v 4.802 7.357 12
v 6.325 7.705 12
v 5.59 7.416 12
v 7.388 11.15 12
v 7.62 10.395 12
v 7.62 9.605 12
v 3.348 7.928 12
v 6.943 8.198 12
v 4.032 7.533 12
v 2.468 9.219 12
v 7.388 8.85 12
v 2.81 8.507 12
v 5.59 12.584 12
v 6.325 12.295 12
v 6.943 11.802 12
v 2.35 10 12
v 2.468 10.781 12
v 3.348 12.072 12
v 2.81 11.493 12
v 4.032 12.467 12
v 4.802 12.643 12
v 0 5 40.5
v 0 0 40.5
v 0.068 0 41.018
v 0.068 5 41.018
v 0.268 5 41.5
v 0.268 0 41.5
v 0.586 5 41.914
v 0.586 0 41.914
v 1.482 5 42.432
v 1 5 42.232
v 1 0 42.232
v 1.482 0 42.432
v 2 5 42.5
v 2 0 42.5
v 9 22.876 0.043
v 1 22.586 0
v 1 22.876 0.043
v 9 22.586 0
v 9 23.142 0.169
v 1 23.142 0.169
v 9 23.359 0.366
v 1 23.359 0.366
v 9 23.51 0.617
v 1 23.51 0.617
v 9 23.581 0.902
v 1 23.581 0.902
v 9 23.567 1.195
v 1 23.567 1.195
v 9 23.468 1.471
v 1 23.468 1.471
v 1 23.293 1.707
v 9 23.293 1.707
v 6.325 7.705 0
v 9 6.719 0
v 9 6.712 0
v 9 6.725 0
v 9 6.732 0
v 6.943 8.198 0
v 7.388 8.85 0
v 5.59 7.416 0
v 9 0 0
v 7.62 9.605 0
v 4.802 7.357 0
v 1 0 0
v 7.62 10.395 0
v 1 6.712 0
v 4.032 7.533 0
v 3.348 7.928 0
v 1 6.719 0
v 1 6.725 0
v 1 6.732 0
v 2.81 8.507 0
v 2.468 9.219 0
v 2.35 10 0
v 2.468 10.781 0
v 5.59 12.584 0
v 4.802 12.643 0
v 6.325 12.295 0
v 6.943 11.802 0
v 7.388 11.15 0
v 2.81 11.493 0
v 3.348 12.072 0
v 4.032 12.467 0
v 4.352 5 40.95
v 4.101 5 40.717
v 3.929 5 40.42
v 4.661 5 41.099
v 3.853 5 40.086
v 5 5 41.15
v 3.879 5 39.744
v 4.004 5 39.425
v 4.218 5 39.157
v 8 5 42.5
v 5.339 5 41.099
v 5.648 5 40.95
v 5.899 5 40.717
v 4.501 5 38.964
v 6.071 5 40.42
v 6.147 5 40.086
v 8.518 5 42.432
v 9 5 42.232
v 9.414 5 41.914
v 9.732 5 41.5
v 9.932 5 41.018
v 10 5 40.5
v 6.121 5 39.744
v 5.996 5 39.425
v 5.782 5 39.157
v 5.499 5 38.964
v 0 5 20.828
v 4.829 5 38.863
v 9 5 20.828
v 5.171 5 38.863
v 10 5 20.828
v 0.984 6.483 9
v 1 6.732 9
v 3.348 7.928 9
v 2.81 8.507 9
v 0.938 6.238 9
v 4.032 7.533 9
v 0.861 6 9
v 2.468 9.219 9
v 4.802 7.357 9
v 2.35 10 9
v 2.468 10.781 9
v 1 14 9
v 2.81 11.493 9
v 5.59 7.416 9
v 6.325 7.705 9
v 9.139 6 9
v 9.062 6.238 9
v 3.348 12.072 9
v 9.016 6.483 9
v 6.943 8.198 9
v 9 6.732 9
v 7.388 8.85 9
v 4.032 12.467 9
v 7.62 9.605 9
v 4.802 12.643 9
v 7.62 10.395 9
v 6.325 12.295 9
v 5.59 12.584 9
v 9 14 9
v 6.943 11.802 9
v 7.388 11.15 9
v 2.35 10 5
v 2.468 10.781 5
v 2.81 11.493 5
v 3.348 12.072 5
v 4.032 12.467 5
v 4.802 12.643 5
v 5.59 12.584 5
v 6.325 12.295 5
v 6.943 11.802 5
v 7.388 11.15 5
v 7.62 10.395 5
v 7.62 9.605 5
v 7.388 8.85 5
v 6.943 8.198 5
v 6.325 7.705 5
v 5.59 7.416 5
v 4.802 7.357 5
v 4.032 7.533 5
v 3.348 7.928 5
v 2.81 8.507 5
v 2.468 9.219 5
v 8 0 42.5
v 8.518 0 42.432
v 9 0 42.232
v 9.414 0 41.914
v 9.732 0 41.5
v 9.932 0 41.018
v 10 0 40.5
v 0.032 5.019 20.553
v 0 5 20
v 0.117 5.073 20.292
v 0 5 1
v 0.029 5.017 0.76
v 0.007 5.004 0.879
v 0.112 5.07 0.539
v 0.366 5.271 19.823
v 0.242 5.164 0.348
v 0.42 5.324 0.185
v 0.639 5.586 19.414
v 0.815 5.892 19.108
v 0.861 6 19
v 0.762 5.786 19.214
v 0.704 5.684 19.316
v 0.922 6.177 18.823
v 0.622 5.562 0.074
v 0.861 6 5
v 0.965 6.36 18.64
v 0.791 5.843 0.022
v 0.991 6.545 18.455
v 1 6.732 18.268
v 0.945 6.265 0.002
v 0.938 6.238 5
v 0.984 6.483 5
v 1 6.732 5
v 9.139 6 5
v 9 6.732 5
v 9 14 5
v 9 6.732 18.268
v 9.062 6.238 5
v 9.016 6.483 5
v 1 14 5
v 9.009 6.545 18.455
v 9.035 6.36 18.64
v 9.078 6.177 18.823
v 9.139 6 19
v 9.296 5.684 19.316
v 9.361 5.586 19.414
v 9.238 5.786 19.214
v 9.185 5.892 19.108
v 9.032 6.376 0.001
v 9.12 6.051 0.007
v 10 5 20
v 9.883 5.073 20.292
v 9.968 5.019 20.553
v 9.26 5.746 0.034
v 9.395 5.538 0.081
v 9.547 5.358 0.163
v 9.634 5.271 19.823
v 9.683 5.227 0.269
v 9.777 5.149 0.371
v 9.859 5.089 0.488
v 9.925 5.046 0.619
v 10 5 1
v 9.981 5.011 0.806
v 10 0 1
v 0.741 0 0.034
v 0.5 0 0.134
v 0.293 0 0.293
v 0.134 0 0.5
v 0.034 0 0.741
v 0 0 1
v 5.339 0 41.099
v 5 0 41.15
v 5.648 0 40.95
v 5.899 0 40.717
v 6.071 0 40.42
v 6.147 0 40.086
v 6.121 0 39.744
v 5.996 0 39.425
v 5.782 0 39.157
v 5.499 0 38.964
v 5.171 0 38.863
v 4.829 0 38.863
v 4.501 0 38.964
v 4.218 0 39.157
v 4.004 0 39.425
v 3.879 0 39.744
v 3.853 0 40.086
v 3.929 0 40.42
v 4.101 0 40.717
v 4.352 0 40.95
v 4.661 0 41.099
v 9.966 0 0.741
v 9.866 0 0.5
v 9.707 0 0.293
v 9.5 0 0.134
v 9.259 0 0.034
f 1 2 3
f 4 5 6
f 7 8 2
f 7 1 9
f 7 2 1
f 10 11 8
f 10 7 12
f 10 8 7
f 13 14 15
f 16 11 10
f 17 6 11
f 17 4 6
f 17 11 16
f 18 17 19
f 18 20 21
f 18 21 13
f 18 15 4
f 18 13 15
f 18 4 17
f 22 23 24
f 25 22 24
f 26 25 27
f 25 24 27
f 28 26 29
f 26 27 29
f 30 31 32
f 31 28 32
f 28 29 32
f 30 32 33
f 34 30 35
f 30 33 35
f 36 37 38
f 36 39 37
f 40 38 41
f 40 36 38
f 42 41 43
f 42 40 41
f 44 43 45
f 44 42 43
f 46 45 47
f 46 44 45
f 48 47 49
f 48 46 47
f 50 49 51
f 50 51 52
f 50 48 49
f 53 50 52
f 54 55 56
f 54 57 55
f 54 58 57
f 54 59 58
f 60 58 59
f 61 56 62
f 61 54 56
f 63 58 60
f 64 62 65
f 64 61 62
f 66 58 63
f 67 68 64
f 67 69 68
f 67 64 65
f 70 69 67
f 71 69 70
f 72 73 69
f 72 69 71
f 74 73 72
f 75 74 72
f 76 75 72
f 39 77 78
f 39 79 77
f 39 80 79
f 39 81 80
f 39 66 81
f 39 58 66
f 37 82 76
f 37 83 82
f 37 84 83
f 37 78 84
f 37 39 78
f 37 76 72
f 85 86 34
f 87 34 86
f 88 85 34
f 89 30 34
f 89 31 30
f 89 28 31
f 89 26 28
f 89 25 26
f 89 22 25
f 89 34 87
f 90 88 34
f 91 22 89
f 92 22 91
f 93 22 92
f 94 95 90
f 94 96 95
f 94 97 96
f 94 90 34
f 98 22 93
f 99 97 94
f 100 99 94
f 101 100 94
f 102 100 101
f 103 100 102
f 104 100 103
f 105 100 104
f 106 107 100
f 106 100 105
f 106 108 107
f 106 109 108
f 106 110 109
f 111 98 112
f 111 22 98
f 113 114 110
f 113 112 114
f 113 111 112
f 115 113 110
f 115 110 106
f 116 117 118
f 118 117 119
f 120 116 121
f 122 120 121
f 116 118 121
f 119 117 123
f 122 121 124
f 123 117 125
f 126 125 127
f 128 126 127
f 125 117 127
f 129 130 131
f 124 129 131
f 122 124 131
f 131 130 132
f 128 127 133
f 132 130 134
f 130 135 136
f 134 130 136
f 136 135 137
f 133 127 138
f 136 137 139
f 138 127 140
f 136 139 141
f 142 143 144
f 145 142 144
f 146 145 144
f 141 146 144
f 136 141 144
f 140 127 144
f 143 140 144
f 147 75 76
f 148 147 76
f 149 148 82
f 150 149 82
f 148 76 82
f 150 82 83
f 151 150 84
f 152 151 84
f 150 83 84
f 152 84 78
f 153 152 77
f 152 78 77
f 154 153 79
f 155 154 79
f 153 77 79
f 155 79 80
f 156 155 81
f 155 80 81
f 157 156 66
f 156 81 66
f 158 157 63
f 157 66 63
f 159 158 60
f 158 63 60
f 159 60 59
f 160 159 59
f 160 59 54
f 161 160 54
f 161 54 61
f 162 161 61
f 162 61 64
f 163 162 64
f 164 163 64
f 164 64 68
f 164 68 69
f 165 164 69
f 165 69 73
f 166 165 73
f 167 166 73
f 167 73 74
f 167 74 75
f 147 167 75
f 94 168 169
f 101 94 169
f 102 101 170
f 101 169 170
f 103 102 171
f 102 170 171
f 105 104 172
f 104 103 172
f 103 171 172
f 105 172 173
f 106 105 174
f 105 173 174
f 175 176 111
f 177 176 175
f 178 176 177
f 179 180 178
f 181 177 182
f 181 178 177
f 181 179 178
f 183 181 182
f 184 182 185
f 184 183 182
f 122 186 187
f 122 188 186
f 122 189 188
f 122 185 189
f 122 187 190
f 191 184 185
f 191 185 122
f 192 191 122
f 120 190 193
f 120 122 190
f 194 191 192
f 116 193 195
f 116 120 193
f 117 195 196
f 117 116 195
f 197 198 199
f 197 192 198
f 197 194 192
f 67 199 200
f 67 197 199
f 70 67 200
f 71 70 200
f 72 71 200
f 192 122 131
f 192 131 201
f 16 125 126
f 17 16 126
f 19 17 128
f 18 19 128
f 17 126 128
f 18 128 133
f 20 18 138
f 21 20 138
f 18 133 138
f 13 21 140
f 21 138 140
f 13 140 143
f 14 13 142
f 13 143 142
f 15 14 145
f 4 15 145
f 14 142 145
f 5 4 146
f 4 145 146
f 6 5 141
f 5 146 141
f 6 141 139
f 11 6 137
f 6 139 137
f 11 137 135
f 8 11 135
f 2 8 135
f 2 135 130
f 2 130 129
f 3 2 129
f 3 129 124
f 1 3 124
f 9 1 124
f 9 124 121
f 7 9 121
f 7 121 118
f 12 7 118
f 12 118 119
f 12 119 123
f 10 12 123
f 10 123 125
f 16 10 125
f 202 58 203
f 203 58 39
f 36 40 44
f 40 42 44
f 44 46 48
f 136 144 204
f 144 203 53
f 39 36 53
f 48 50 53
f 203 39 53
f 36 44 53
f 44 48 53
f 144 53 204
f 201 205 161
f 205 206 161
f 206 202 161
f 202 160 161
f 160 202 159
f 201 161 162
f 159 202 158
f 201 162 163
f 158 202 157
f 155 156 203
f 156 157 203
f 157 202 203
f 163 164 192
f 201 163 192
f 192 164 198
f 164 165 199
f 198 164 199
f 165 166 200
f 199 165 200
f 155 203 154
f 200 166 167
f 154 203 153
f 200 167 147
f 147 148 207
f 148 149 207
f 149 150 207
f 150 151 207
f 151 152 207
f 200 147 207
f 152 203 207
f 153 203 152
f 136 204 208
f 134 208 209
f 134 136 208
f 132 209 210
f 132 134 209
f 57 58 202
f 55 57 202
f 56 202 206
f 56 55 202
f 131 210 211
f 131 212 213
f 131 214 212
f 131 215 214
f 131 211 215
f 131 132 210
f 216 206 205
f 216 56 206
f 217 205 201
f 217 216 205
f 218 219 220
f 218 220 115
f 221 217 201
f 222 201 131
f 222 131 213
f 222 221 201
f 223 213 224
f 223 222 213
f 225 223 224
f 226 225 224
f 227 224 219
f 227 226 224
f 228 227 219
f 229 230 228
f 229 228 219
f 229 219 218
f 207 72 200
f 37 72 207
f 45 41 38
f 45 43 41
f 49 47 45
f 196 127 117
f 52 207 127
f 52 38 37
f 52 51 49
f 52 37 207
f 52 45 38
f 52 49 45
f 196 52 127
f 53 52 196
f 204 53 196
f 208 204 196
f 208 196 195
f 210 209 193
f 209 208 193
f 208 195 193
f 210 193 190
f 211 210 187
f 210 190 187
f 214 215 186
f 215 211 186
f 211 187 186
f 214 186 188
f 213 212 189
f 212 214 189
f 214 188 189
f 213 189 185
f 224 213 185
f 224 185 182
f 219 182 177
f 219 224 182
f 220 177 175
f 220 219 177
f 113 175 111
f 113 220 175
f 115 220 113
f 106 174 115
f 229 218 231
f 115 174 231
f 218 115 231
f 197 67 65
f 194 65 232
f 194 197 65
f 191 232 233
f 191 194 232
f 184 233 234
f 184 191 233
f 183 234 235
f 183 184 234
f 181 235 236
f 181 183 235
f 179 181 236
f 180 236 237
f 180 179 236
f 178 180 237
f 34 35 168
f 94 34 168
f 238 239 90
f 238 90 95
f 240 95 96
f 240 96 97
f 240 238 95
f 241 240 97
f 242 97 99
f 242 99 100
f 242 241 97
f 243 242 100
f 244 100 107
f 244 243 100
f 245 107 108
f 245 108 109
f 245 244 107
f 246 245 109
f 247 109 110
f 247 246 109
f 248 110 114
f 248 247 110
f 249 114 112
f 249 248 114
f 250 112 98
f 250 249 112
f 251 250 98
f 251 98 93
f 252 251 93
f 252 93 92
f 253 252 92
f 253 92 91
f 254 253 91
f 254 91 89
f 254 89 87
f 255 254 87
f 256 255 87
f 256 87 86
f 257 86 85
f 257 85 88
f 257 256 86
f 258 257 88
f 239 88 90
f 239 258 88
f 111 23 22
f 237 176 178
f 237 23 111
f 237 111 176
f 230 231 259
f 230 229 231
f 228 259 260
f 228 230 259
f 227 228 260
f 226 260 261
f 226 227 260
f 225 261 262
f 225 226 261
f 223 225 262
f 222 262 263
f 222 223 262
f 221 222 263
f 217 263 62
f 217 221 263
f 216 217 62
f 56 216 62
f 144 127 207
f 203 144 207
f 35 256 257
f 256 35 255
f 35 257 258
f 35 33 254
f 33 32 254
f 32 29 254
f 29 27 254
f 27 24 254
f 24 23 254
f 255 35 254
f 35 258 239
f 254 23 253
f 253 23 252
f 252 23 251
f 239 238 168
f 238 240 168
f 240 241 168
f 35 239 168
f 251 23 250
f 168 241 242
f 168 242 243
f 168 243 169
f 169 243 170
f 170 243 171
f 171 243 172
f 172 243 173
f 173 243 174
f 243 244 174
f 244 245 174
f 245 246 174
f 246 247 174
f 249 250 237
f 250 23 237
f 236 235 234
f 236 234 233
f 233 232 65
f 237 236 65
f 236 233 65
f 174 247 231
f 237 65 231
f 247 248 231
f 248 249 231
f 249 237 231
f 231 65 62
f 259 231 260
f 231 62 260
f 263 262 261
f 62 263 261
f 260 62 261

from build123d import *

# Parameters (mm, degrees)
SKETCH2_W                = 10
SKETCH2_H                = 42.5
SKETCH2_R                = 1.15
BOSS_EXTRUDE1_DEPTH      = 5
BOSS_EXTRUDE2_DEPTH      = 4
BOSS_EXTRUDE2_DEPTH_BACK = 4
SKETCH4_R                = 2.65
CUT_EXTRUDE1_DEPTH       = 12
SKETCH5_W                = 4
SKETCH5_H                = 8
CUT_EXTRUDE2_DEPTH       = 51.122350304
FILLET1_R                = 2
FILLET2_R                = 1


# Some blends are built 0.0001 mm under size
with BuildPart() as part:
    # Sketch2 → Boss-Extrude1 (new body)
    with BuildSketch(Plane(origin=(0, 0, 0), x_dir=(1, 0, 0), z_dir=(0, 1, 0))):
        with Locations((5, -21.25)):
            Rectangle(SKETCH2_W, SKETCH2_H)
        with Locations(Location((5, -40, 0), (0, 0, 270))):
            Circle(SKETCH2_R, mode=Mode.SUBTRACT)
    extrude(amount=BOSS_EXTRUDE1_DEPTH)

    # Sketch3 → Boss-Extrude2 (add, two sides: drawn at the far end of the back side and taken through both)
    with BuildSketch(Plane(origin=(5, 0, 0), x_dir=(0, 0, -1), z_dir=(1, 0, 0)).offset(-BOSS_EXTRUDE2_DEPTH_BACK)):
        Polygon((0, 5), (-20, 5), (0, 25), align=None)
    extrude(amount=BOSS_EXTRUDE2_DEPTH + BOSS_EXTRUDE2_DEPTH_BACK)

    # Sketch4 → Cut-Extrude1 (cut)
    with BuildSketch(Plane(origin=(0, 0, 0), x_dir=(-1, 0, 0), z_dir=(0, 0, -1))):
        with Locations((-5, 10)):
            Circle(SKETCH4_R)
    extrude(amount=-CUT_EXTRUDE1_DEPTH, mode=Mode.SUBTRACT)

    # Sketch5 → Cut-Extrude2 (cut, through all)
    with BuildSketch(Plane(origin=(9, 0, 0), x_dir=(0, 0, -1), z_dir=(1, 0, 0))):
        with Locations((-7, 10)):
            Rectangle(SKETCH5_W, SKETCH5_H)
    extrude(amount=-CUT_EXTRUDE2_DEPTH, mode=Mode.SUBTRACT)

    # Fillet1
    # the kernel refuses this fillet: 2 mm, written as the material it adds along each edge
    with BuildSketch(Plane(origin=(1, 5, 0), x_dir=(-1, 0, 0), z_dir=(0, 0, 1))) as fillet1_piece_1_section:
        with BuildLine():
            CenterArc((2, -1.732050808), FILLET1_R, 120, 60)
            Line((0, -1.732050808), (0, 0))
            Line((0, 0), (1, 0))
        make_face()
    fillet1_piece_1 = extrude(amount=24.330127019, mode=Mode.PRIVATE)
    fillet1_piece_1 = split(fillet1_piece_1, bisect_by=Plane(origin=(1, 15, 10), z_dir=(0, -0.7071067811865475, -0.7071067811865476)), keep=Keep.TOP, mode=Mode.PRIVATE)
    fillet1_piece_1 = split(fillet1_piece_1, bisect_by=Plane(origin=(1, 6, 0), z_dir=(0, -1, 0)), keep=Keep.TOP, mode=Mode.PRIVATE)
    add(fillet1_piece_1)
    with BuildSketch(Plane(origin=(1, 5, 0), x_dir=(-1, 0, 0), z_dir=(0, 0, 1))) as fillet1_piece_2_section:
        with BuildLine():
            CenterArc((2, -1.732050808), FILLET1_R, 120, 60)
            Line((0, -1.732050808), (0, 0))
            Line((0, 0), (1, 0))
        make_face()
    fillet1_piece_2 = extrude(amount=24.330127019, mode=Mode.PRIVATE)
    fillet1_piece_2 = split(fillet1_piece_2, bisect_by=Plane(origin=(1, 5, 5), z_dir=(0, 0, -1)), keep=Keep.TOP, mode=Mode.PRIVATE)
    add(fillet1_piece_2)
    with BuildSketch(Plane(origin=(1, 5, -4.330127019), x_dir=(-1, 0, 0), z_dir=(0, 0, 1))) as fillet1_piece_3_section:
        with BuildLine():
            CenterArc((2, -1.732050808), FILLET1_R, 120, 60)
            Line((0, -1.732050808), (0, 0))
            Line((0, 0), (1, 0))
        make_face()
    fillet1_piece_3 = extrude(amount=28.660254038, mode=Mode.PRIVATE)
    fillet1_piece_3 = split(fillet1_piece_3, bisect_by=Plane(origin=(1, 17.165063509, 7.834936491), z_dir=(0, -0.7071067811865475, -0.7071067811865476)), keep=Keep.TOP, mode=Mode.PRIVATE)
    fillet1_piece_3 = split(fillet1_piece_3, bisect_by=Plane(origin=(1, 5, 9), z_dir=(0, 0, 1)), keep=Keep.TOP, mode=Mode.PRIVATE)
    add(fillet1_piece_3)
    with BuildSketch(Plane(origin=(9, 5, 0), x_dir=(1, 0, 0), z_dir=(0, 0, 1))) as fillet1_piece_4_section:
        with BuildLine():
            CenterArc((2, 1.732050808), FILLET1_R, 180, 60)
            Line((0, 1.732050808), (0, 0))
            Line((0, 0), (1, 0))
        make_face()
    fillet1_piece_4 = extrude(amount=24.330127019, mode=Mode.PRIVATE)
    fillet1_piece_4 = split(fillet1_piece_4, bisect_by=Plane(origin=(9, 15, 10), z_dir=(0, -0.7071067811865475, -0.7071067811865476)), keep=Keep.TOP, mode=Mode.PRIVATE)
    fillet1_piece_4 = split(fillet1_piece_4, bisect_by=Plane(origin=(9, 6, 0), z_dir=(0, -1, 0)), keep=Keep.TOP, mode=Mode.PRIVATE)
    add(fillet1_piece_4)
    with BuildSketch(Plane(origin=(9, 5, 0), x_dir=(1, 0, 0), z_dir=(0, 0, 1))) as fillet1_piece_5_section:
        with BuildLine():
            CenterArc((2, 1.732050808), FILLET1_R, 180, 60)
            Line((0, 1.732050808), (0, 0))
            Line((0, 0), (1, 0))
        make_face()
    fillet1_piece_5 = extrude(amount=24.330127019, mode=Mode.PRIVATE)
    fillet1_piece_5 = split(fillet1_piece_5, bisect_by=Plane(origin=(9, 5, 5), z_dir=(0, 0, -1)), keep=Keep.TOP, mode=Mode.PRIVATE)
    add(fillet1_piece_5)
    with BuildSketch(Plane(origin=(9, 5, -4.330127019), x_dir=(1, 0, 0), z_dir=(0, 0, 1))) as fillet1_piece_6_section:
        with BuildLine():
            CenterArc((2, 1.732050808), FILLET1_R, 180, 60)
            Line((0, 1.732050808), (0, 0))
            Line((0, 0), (1, 0))
        make_face()
    fillet1_piece_6 = extrude(amount=28.660254038, mode=Mode.PRIVATE)
    fillet1_piece_6 = split(fillet1_piece_6, bisect_by=Plane(origin=(9, 17.165063509, 7.834936491), z_dir=(0, -0.7071067811865475, -0.7071067811865476)), keep=Keep.TOP, mode=Mode.PRIVATE)
    fillet1_piece_6 = split(fillet1_piece_6, bisect_by=Plane(origin=(9, 5, 9), z_dir=(0, 0, 1)), keep=Keep.TOP, mode=Mode.PRIVATE)
    add(fillet1_piece_6)
    with BuildSketch(Plane(origin=(9, 5, 20), x_dir=(0, 0, 1), z_dir=(-1, 0, 0))) as fillet1_piece_7:
        with BuildLine():
            CenterArc((FILLET1_R * 0.414213562373, FILLET1_R), FILLET1_R, 225, 45)
            Line((-FILLET1_R * 0.292893218813, FILLET1_R * 0.292893218813), (0, 0))
            Line((0, 0), (FILLET1_R * 0.414213562373, 0))
        make_face()
    extrude(amount=8)
    with BuildSketch(Plane(origin=(9, 5, 20), x_dir=(0, 0, 1), z_dir=(-1, 0, 0))) as fillet1_piece_8a_section:
        with BuildLine():
            CenterArc((FILLET1_R * 0.414213562373, FILLET1_R), FILLET1_R, 225, 45)
            Line((-FILLET1_R * 0.292893218813, FILLET1_R * 0.292893218813), (0, 0))
            Line((0, 0), (FILLET1_R * 0.414213562373, 0))
        make_face()
    fillet1_piece_8a = extrude(amount=10.071067812, mode=Mode.PRIVATE)
    fillet1_piece_8a = split(fillet1_piece_8a, bisect_by=Plane(origin=(0, 5, 20), z_dir=(1, 0, 0)), keep=Keep.TOP, mode=Mode.PRIVATE)
    fillet1_piece_8a = split(fillet1_piece_8a, bisect_by=Plane(origin=(1, 5, 20), z_dir=(-1, 0, 0)), keep=Keep.TOP, mode=Mode.PRIVATE)
    with BuildSketch(Plane(origin=(1, 5, 0), x_dir=(-1, 0, 0), z_dir=(0, 0, 1))) as fillet1_piece_8b_section:
        with BuildLine():
            CenterArc((2, -1.732050808), FILLET1_R, 120, 60)
            Line((0, -1.732050808), (0, 0))
            Line((0, 0), (1, 0))
        make_face()
    fillet1_piece_8b = extrude(amount=24.330127019, mode=Mode.PRIVATE)
    fillet1_piece_8b = split(fillet1_piece_8b, bisect_by=Plane(origin=(1, 15, 10), z_dir=(0, 0.7071067811865475, 0.7071067811865476)), keep=Keep.TOP, mode=Mode.PRIVATE)
    fillet1_piece_8b = split(fillet1_piece_8b, bisect_by=Plane(origin=(1, 6, 0), z_dir=(0, -1, 0)), keep=Keep.TOP, mode=Mode.PRIVATE)
    fillet1_piece_8 = fillet1_piece_8a & fillet1_piece_8b
    add(fillet1_piece_8)
    with BuildSketch(Plane(origin=(9, 5, 0), x_dir=(1, 0, 0), z_dir=(0, 0, 1))) as fillet1_piece_9a_section:
        with BuildLine():
            CenterArc((2, 1.732050808), FILLET1_R, 180, 60)
            Line((0, 1.732050808), (0, 0))
            Line((0, 0), (1, 0))
        make_face()
    fillet1_piece_9a = extrude(amount=24.330127019, mode=Mode.PRIVATE)
    fillet1_piece_9a = split(fillet1_piece_9a, bisect_by=Plane(origin=(9, 15, 10), z_dir=(0, 0.7071067811865475, 0.7071067811865476)), keep=Keep.TOP, mode=Mode.PRIVATE)
    fillet1_piece_9a = split(fillet1_piece_9a, bisect_by=Plane(origin=(9, 6, 0), z_dir=(0, -1, 0)), keep=Keep.TOP, mode=Mode.PRIVATE)
    with BuildSketch(Plane(origin=(11.071067812, 5, 20), x_dir=(0, 0, 1), z_dir=(-1, 0, 0))) as fillet1_piece_9b_section:
        with BuildLine():
            CenterArc((FILLET1_R * 0.414213562373, FILLET1_R), FILLET1_R, 225, 45)
            Line((-FILLET1_R * 0.292893218813, FILLET1_R * 0.292893218813), (0, 0))
            Line((0, 0), (FILLET1_R * 0.414213562373, 0))
        make_face()
    fillet1_piece_9b = extrude(amount=10.071067812, mode=Mode.PRIVATE)
    fillet1_piece_9b = split(fillet1_piece_9b, bisect_by=Plane(origin=(10, 5, 20), z_dir=(-1, 0, 0)), keep=Keep.TOP, mode=Mode.PRIVATE)
    fillet1_piece_9b = split(fillet1_piece_9b, bisect_by=Plane(origin=(9, 5, 20), z_dir=(1, 0, 0)), keep=Keep.TOP, mode=Mode.PRIVATE)
    fillet1_piece_9 = fillet1_piece_9a & fillet1_piece_9b
    add(fillet1_piece_9)
    # the kernel refuses this fillet: 2 mm, written as the material it takes off along each edge
    with BuildSketch(Plane(origin=(0, -5, 42.5), x_dir=(1, 0, 0), z_dir=(0, 1, 0))) as fillet1_2_piece_1:
        with BuildLine():
            CenterArc((FILLET1_R, FILLET1_R), FILLET1_R, 180, 90)
            Line((0, FILLET1_R), (0, 0))
            Line((0, 0), (FILLET1_R, 0))
        make_face()
    extrude(amount=15, mode=Mode.SUBTRACT)
    with BuildSketch(Plane(origin=(10, -5, 42.5), x_dir=(-1, 0, 0), z_dir=(0, 1, 0))) as fillet1_2_piece_2:
        with BuildLine():
            CenterArc((FILLET1_R, -FILLET1_R), FILLET1_R, 90, 90)
            Line((0, -FILLET1_R), (0, 0))
            Line((0, 0), (FILLET1_R, 0))
        make_face()
    extrude(amount=15, mode=Mode.SUBTRACT)

    # Fillet2
    fillet2_edges = [part.edges().sort_by_distance(p)[0] for p in [
        (0, 2.5, 0),
        (10, 2.5, 0),
        (5, 25, 0),
    ]]
    fillet(fillet2_edges, radius=FILLET2_R - 0.0001)  # a hair under: the kernel refuses the full size


solid = part.part
